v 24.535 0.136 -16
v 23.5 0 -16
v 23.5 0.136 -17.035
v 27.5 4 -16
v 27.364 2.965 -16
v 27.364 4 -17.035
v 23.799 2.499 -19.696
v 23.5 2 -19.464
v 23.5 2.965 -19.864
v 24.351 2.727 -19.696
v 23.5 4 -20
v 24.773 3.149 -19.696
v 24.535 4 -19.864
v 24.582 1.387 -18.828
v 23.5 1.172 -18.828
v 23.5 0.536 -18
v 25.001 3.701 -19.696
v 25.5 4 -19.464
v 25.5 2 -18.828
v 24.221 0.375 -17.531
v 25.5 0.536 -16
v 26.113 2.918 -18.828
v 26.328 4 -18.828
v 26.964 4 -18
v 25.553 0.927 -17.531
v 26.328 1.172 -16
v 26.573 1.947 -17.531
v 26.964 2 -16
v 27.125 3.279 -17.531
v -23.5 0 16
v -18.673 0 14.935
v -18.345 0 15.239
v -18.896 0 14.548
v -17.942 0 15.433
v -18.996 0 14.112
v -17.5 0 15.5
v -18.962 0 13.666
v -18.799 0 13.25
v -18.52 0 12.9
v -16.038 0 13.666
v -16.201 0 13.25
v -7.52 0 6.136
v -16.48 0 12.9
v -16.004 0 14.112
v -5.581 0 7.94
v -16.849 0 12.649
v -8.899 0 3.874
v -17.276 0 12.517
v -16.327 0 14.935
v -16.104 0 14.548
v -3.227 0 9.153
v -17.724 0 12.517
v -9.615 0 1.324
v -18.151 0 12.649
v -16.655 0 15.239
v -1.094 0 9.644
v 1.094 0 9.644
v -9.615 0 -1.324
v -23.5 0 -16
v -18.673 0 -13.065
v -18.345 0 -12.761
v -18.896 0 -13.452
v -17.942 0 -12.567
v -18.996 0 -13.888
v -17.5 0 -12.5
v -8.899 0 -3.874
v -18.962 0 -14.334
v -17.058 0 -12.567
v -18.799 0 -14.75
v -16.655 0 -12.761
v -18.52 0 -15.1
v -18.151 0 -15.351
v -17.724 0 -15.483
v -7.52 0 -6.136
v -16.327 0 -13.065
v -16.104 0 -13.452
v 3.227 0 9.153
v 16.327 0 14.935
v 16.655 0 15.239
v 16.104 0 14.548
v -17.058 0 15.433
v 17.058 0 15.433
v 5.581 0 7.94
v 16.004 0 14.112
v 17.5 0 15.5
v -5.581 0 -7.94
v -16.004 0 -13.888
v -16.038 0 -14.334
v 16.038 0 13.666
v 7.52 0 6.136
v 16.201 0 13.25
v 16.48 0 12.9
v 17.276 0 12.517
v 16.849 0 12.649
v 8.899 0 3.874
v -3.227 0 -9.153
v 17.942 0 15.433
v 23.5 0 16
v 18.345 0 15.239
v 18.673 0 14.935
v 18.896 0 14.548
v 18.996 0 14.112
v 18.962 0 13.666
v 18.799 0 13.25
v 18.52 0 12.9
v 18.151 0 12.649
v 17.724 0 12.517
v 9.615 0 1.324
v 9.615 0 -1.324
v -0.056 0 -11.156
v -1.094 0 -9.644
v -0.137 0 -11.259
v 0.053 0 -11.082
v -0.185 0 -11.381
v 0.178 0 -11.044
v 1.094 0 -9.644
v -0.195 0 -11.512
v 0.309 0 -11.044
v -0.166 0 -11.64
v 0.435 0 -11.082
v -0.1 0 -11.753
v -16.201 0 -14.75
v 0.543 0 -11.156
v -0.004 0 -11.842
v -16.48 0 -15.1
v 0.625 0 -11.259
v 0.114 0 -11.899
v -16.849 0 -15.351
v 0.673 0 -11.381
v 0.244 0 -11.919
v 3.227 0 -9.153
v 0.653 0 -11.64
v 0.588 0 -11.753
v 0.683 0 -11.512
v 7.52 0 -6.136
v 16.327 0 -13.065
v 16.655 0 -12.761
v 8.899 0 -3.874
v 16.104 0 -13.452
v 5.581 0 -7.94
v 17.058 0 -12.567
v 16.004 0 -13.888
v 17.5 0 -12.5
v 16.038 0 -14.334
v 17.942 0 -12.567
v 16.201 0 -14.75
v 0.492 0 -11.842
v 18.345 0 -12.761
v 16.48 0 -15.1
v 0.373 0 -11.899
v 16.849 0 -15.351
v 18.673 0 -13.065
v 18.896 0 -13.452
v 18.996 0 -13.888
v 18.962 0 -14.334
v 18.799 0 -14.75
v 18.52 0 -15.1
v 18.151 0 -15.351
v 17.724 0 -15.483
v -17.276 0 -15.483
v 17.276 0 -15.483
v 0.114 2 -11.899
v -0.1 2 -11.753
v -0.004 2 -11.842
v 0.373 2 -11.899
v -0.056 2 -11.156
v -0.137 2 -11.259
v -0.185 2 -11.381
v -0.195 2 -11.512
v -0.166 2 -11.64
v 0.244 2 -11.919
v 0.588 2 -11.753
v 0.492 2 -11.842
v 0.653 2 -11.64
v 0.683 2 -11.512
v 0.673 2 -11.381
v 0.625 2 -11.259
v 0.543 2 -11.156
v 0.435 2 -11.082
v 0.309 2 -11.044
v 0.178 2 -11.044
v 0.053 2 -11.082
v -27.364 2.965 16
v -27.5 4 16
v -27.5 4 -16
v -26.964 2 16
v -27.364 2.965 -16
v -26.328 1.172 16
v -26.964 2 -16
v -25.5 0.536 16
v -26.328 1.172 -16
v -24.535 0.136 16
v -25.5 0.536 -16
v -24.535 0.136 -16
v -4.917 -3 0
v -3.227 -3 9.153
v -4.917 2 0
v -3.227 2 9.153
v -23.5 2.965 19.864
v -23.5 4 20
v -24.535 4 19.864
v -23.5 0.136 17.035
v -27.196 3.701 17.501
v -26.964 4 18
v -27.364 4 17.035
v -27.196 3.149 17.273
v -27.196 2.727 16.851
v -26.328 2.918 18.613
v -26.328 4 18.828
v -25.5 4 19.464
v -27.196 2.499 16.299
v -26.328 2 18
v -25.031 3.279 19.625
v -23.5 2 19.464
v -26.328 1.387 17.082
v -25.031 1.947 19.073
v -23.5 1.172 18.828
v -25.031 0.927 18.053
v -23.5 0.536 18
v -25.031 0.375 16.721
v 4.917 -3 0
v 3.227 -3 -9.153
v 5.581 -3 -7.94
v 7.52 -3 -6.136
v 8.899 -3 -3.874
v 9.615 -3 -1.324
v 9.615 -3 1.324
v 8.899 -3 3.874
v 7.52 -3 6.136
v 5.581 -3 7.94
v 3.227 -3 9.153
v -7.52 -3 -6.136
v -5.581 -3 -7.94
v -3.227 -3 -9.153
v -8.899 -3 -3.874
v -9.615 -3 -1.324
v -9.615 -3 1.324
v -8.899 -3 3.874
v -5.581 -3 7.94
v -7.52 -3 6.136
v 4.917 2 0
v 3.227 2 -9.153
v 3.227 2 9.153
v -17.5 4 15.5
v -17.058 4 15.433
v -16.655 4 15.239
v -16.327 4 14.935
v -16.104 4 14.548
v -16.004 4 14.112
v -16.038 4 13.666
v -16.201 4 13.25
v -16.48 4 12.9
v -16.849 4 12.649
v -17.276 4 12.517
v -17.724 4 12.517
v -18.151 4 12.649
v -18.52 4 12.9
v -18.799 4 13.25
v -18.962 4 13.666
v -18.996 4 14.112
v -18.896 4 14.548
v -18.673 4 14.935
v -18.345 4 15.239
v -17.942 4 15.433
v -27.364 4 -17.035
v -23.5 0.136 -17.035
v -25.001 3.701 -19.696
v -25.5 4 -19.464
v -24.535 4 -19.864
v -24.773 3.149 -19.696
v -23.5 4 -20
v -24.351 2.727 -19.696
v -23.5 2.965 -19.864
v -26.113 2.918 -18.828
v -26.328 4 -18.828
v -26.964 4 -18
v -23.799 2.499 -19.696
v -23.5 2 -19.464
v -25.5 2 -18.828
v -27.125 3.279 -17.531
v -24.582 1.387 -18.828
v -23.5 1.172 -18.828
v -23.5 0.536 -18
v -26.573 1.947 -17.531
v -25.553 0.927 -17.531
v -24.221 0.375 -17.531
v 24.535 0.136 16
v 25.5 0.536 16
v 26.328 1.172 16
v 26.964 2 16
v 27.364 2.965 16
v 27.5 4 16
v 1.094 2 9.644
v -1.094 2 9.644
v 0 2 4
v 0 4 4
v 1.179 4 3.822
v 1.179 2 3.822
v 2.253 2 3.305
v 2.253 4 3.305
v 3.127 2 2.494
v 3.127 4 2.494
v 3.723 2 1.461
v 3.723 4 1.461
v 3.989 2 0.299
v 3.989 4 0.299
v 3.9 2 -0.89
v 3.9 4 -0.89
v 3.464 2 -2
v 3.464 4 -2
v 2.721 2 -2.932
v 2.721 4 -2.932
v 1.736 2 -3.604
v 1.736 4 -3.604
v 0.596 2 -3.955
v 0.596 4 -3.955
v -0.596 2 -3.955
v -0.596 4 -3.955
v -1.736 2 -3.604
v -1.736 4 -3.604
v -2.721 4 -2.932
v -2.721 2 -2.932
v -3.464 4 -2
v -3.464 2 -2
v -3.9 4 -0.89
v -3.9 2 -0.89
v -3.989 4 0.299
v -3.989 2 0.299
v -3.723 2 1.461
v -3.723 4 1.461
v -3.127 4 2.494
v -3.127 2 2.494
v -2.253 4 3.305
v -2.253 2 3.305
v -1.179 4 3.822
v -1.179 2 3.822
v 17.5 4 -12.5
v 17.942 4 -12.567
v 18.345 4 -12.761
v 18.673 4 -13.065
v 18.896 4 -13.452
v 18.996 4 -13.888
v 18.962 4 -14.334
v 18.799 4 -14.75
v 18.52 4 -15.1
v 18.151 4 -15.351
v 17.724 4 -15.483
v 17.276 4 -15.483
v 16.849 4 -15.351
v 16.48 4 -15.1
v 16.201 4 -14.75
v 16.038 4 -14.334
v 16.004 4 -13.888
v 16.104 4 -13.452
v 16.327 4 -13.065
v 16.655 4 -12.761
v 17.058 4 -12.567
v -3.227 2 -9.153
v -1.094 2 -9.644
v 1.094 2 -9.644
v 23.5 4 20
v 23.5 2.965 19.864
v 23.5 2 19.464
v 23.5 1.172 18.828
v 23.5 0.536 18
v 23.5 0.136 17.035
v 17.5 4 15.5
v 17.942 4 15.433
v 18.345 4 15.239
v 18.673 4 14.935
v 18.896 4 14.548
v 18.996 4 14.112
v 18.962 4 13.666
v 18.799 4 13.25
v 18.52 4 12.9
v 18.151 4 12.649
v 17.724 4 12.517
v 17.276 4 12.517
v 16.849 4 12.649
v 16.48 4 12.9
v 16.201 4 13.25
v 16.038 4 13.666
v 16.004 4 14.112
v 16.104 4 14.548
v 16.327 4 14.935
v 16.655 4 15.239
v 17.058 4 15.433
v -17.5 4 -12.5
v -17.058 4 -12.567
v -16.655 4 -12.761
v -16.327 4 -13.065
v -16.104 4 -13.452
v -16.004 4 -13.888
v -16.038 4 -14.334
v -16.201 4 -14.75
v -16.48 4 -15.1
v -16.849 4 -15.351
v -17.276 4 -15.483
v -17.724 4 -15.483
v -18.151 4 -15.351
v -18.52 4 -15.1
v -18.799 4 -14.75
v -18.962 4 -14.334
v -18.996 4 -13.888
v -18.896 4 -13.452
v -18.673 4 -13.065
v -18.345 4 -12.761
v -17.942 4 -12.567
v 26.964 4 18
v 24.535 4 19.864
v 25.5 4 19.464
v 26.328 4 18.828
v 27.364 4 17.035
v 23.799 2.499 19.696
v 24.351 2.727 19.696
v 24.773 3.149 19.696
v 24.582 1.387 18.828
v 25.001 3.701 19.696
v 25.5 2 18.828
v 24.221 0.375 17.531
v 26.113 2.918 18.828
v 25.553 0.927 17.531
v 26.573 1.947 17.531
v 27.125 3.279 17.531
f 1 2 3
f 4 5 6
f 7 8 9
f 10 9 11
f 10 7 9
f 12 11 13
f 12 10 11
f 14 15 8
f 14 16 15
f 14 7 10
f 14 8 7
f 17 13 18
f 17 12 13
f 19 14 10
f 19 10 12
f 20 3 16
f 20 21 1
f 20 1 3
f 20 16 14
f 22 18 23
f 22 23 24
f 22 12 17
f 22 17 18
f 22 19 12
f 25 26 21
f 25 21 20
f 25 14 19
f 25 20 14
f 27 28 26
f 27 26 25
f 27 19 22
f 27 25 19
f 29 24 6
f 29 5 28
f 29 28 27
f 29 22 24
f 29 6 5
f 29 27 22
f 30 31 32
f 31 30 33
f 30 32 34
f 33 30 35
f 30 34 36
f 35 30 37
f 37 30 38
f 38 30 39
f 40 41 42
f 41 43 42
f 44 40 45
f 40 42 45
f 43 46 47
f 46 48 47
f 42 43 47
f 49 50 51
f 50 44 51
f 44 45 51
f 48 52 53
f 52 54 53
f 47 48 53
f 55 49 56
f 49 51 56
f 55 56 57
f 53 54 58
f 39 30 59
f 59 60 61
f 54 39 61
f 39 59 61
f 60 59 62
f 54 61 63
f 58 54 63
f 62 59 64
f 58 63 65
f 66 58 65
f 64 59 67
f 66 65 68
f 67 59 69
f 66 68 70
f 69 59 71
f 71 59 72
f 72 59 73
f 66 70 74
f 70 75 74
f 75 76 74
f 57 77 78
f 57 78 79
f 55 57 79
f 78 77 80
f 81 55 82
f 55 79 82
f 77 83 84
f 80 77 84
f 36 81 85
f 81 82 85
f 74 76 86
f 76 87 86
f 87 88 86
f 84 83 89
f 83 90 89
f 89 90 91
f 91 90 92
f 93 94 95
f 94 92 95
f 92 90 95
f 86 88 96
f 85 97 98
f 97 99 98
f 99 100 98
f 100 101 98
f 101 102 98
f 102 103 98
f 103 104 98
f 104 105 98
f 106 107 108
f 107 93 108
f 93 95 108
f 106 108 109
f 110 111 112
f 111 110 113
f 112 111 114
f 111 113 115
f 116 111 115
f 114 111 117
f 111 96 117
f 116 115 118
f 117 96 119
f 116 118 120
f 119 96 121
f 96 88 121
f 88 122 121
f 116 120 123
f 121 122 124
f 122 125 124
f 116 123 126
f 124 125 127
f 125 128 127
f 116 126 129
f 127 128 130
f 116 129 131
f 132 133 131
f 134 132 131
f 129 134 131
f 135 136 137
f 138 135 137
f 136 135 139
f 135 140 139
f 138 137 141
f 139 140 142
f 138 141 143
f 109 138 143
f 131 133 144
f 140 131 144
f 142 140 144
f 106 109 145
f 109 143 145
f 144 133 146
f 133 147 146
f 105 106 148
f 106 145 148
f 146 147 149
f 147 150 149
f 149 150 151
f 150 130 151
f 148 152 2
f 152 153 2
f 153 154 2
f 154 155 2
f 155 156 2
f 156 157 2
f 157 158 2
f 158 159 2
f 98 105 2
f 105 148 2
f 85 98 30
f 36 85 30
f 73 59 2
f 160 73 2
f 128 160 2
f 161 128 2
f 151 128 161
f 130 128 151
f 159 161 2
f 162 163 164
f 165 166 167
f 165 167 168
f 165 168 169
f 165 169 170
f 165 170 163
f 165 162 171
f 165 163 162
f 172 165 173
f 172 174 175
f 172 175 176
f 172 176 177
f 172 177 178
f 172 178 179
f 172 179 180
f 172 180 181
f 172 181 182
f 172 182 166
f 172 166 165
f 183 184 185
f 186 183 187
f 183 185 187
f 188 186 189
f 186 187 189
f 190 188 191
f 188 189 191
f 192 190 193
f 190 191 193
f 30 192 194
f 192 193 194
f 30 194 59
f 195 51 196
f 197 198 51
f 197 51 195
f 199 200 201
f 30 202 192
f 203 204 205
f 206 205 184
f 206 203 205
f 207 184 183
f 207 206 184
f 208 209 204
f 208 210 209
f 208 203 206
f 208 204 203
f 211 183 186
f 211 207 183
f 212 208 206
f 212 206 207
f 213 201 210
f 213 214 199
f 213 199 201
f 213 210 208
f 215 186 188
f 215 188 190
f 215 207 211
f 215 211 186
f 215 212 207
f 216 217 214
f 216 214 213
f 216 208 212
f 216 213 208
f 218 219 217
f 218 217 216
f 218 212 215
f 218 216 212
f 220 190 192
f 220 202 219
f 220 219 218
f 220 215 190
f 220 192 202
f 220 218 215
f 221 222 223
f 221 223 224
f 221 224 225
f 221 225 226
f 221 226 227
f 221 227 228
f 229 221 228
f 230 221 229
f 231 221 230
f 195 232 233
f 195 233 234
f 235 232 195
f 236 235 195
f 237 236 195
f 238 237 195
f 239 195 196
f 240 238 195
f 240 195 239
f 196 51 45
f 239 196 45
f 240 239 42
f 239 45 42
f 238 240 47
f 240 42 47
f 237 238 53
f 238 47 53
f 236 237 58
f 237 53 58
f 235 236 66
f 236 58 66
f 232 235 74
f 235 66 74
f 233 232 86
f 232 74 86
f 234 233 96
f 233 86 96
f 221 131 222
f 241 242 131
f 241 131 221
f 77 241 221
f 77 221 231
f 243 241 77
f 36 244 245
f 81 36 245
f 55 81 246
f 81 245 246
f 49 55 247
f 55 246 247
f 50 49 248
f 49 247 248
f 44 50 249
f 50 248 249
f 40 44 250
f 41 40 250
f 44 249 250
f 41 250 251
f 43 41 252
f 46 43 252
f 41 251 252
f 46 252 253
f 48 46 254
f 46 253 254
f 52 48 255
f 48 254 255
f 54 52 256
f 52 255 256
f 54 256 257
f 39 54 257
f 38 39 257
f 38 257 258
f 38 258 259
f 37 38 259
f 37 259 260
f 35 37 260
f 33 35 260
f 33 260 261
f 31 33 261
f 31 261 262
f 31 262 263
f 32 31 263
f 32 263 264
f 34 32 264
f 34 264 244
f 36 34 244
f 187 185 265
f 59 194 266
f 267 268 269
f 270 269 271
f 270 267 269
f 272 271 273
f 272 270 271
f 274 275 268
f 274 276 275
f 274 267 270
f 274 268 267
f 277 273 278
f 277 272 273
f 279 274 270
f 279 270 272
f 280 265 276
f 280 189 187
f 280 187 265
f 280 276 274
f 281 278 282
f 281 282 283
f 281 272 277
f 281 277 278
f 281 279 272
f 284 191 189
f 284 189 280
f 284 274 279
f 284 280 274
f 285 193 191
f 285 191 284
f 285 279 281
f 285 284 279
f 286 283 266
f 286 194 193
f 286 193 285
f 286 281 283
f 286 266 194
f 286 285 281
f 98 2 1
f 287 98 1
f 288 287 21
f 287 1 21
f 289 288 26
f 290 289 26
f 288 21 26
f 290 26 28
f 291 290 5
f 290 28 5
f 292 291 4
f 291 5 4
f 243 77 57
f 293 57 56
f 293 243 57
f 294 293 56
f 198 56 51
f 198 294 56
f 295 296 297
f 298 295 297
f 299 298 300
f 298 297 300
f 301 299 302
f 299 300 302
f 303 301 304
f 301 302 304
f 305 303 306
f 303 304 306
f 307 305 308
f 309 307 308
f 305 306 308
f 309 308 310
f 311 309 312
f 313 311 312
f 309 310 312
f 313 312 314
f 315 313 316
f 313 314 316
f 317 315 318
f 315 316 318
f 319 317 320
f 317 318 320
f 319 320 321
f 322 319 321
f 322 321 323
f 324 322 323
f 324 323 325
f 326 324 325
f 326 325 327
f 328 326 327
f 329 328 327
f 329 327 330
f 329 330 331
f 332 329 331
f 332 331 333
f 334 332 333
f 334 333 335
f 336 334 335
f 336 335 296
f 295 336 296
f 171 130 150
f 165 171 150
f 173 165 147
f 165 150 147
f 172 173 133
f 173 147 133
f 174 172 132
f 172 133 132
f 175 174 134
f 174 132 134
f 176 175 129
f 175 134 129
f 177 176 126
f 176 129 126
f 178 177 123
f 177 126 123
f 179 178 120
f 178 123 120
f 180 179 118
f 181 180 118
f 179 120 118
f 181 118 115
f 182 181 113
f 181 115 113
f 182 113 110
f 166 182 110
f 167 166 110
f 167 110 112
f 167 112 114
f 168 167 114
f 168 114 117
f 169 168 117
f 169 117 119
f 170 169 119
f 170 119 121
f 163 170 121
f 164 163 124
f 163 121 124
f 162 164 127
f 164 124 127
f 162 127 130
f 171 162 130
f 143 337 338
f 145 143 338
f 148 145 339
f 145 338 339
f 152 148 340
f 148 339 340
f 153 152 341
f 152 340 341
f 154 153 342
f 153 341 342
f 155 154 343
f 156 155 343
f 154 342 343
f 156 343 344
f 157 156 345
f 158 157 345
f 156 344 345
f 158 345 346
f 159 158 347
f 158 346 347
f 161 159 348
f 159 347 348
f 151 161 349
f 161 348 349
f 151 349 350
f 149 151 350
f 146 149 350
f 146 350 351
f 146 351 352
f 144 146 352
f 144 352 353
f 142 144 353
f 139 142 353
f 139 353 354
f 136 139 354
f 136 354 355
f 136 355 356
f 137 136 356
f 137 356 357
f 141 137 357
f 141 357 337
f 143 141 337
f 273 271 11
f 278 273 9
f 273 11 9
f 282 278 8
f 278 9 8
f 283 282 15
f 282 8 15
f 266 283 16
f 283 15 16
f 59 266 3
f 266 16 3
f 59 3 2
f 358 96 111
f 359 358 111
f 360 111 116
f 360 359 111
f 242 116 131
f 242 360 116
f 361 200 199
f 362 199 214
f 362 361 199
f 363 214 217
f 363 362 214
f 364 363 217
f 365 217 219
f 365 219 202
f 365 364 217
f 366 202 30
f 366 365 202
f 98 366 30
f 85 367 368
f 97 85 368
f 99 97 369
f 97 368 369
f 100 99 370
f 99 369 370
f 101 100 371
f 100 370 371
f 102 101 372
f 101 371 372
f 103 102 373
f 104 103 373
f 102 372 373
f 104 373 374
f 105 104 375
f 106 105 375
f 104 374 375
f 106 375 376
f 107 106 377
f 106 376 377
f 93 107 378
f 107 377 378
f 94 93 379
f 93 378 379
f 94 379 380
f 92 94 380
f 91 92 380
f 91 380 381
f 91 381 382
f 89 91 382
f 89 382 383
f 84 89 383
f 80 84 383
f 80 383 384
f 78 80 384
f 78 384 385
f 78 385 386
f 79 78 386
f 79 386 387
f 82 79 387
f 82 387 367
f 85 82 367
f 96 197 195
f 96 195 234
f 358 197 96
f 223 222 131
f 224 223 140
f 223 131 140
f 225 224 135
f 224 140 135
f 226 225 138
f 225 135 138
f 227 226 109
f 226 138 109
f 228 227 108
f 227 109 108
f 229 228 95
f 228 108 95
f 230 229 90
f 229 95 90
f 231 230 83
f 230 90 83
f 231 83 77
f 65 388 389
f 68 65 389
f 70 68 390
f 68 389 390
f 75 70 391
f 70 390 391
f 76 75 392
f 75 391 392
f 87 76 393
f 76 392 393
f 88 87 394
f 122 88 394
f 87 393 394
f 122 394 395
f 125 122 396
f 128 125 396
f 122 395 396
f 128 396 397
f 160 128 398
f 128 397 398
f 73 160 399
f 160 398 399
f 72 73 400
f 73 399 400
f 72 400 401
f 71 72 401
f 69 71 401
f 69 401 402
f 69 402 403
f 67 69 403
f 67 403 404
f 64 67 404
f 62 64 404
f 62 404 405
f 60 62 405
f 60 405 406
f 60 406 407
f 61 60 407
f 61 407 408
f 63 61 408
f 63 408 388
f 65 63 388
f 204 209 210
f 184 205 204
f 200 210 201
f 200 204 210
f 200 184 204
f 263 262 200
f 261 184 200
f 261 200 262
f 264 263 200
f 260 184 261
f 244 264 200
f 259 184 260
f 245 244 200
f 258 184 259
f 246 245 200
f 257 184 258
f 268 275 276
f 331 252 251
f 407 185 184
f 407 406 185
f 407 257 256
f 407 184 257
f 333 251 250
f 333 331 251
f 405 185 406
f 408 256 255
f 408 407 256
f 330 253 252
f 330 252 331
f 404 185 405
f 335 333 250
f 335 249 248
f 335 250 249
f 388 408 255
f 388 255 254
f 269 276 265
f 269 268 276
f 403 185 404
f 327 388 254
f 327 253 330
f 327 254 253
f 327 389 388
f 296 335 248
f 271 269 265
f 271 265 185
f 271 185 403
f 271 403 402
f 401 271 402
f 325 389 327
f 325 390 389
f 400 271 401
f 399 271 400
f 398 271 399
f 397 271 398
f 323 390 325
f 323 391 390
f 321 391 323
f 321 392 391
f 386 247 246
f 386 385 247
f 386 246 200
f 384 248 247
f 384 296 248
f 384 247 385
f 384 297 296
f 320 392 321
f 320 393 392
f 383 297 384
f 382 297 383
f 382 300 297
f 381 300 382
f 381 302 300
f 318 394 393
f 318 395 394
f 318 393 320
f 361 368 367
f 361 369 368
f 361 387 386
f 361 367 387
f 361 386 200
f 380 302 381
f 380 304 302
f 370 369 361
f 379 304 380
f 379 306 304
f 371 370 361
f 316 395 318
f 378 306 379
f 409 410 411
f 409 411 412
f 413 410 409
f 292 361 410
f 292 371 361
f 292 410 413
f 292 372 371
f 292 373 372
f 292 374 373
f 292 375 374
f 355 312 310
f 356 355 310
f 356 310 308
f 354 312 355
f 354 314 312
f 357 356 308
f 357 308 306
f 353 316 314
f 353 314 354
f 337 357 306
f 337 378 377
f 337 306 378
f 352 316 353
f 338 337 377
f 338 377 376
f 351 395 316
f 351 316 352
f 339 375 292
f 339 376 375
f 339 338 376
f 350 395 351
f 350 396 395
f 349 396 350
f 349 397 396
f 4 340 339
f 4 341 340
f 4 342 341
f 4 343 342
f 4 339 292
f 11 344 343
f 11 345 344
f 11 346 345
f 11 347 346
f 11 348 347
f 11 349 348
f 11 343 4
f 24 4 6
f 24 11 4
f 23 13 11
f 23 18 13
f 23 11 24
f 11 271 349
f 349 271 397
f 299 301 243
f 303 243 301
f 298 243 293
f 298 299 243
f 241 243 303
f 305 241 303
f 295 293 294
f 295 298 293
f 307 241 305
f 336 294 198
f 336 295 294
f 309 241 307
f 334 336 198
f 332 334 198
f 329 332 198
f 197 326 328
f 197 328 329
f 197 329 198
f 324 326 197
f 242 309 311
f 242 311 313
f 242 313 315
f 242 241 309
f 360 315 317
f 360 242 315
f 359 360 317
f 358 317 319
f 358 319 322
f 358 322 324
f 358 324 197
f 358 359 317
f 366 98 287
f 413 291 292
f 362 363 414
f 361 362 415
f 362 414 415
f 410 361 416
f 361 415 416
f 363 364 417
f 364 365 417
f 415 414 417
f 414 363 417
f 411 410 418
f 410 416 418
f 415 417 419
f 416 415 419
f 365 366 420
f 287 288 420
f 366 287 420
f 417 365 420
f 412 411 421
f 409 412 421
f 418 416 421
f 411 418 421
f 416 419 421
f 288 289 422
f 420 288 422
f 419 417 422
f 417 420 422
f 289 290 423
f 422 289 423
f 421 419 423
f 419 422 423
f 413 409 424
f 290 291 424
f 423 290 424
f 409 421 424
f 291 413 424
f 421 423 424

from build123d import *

# Parameters (mm, degrees)
SKETCH_1_W             = 55
SKETCH_1_H             = 40
EXTRUDE_1_DEPTH        = 4
CUT_EXTRUDE_START      = 4
SKETCH_1_6_OUTSIDE_W   = 70.624
SKETCH_1_6_OUTSIDE_H   = 55.624
SKETCH_1_6_OUTSIDE_W_2 = 55
SKETCH_1_6_OUTSIDE_H_2 = 40
SKETCH_1_6_OUTSIDE_R   = 4
SKETCH_1_6_OUTSIDE_R_2 = 1.5
CUT_EXTRUDE_5_DEPTH    = 5
FILLET_4_R             = 4
FILLET_6_R             = 4
FILLET_7_R             = 4
FILLET_8_R             = 4
SKETCH_2_R             = 9.705576387
EXTRUDE_2_DEPTH        = 3
CUT_EXTRUDE_START_2    = -5
CUT_EXTRUDE_7_DEPTH    = 5
SKETCH_4_R             = 0.44
CUT_EXTRUDE_8_DEPTH    = 2


with BuildPart() as part:
    # 草图1 → 凸台-拉伸1 (new body)
    with BuildSketch(Plane(origin=(0, 0, 0), x_dir=(1, 0, 0), z_dir=(0, 1, 0))):
        Rectangle(SKETCH_1_W, SKETCH_1_H)
    extrude(amount=EXTRUDE_1_DEPTH)

    # 草图1<6> outside → 切除-拉伸5 (cut)
    # profile 1 of 6: a face of its own
    with BuildSketch(Plane(origin=(0, 0, 0), x_dir=(1, 0, 0), z_dir=(0, 1, 0)).offset(CUT_EXTRUDE_START)):
        Rectangle(SKETCH_1_6_OUTSIDE_W, SKETCH_1_6_OUTSIDE_H)
        Rectangle(SKETCH_1_6_OUTSIDE_W_2, SKETCH_1_6_OUTSIDE_H_2, mode=Mode.SUBTRACT)
    # profile 2 of 6: a face of its own
    with BuildSketch(Plane(origin=(0, 0, 0), x_dir=(1, 0, 0), z_dir=(0, 1, 0)).offset(CUT_EXTRUDE_START)):
        with Locations(Location((0, 0, 0), (0, 0, 270))):
            Circle(SKETCH_1_6_OUTSIDE_R)
    # profile 3 of 6: a face of its own
    with BuildSketch(Plane(origin=(0, 0, 0), x_dir=(1, 0, 0), z_dir=(0, 1, 0)).offset(CUT_EXTRUDE_START)):
        with Locations(Location((-17.5, 14, 0), (0, 0, 270))):
            Circle(SKETCH_1_6_OUTSIDE_R_2)
    # profile 4 of 6: a face of its own
    with BuildSketch(Plane(origin=(0, 0, 0), x_dir=(1, 0, 0), z_dir=(0, 1, 0)).offset(CUT_EXTRUDE_START)):
        with Locations(Location((17.5, 14, 0), (0, 0, 270))):
            Circle(SKETCH_1_6_OUTSIDE_R_2)
    # profile 5 of 6: a face of its own
    with BuildSketch(Plane(origin=(0, 0, 0), x_dir=(1, 0, 0), z_dir=(0, 1, 0)).offset(CUT_EXTRUDE_START)):
        with Locations(Location((17.5, -14, 0), (0, 0, 270))):
            Circle(SKETCH_1_6_OUTSIDE_R_2)
    # profile 6 of 6: a face of its own
    with BuildSketch(Plane(origin=(0, 0, 0), x_dir=(1, 0, 0), z_dir=(0, 1, 0)).offset(CUT_EXTRUDE_START)):
        with Locations(Location((-17.5, -14, 0), (0, 0, 270))):
            Circle(SKETCH_1_6_OUTSIDE_R_2)
    extrude(amount=-CUT_EXTRUDE_5_DEPTH, mode=Mode.SUBTRACT)

    # 圆角4
    fillet_4_edges = [part.edges().sort_by_distance(p)[0] for p in [
        (27.5, 0, 0),
    ]]
    fillet(fillet_4_edges, radius=FILLET_4_R - 0.0001)  # a hair under: the kernel refuses the full size

    # 圆角6
    fillet_6_edges = [part.edges().sort_by_distance(p)[0] for p in [
        (26.328456414, 1.171543586, 20),
        (-1.99995, 0, 20),
    ]]
    fillet(fillet_6_edges, radius=FILLET_6_R - 0.0001)  # a hair under: the kernel refuses the full size

    # 圆角7
    fillet_7_edges = [part.edges().sort_by_distance(p)[0] for p in [
        (-27.5, 1.171543586, 18.828456414),
        (-27.5, 0, -1.99995),
    ]]
    fillet(fillet_7_edges, radius=FILLET_7_R - 0.0001)  # a hair under: the kernel refuses the full size

    # 圆角8
    fillet_8_edges = [part.edges().sort_by_distance(p)[0] for p in [
        (26.328456414, 1.171543586, -20),
        (0, 0, -20),
        (-26.328456414, 1.171543586, -20),
    ]]
    fillet(fillet_8_edges, radius=FILLET_8_R - 0.0001)  # a hair under: the kernel refuses the full size

    # 草图2 → 凸台-拉伸2 (add)
    with BuildSketch(Plane.XZ):
        with Locations(Location((0, 0, 0), (0, 0, 90))):
            Circle(SKETCH_2_R)
    extrude(amount=EXTRUDE_2_DEPTH)

    # 草图3 → 切除-拉伸7 (cut)
    with BuildSketch(Plane(origin=(0, -3, 0), x_dir=(-1, 0, 0), z_dir=(0, -1, 0)).offset(CUT_EXTRUDE_START_2)):
        with BuildLine():
            Line((3.226722166, -9.153495347), (4.917462581, 0))
            Line((4.917462581, 0), (3.226722166, 9.153495347))
            ThreePointArc((3.226722166, 9.153495347), (0, 9.705576387), (-3.226722166, 9.153495347))
            Line((-3.226722166, 9.153495347), (-4.917462581, 0))
            Line((-4.917462581, 0), (-3.226722166, -9.153495347))
            ThreePointArc((-3.226722166, -9.153495347), (0, -9.705576387), (3.226722166, -9.153495347))
        make_face()
    extrude(amount=CUT_EXTRUDE_7_DEPTH, mode=Mode.SUBTRACT)

    # 草图4 → 切除-拉伸8 (cut)
    with BuildSketch(Plane.XZ):
        with Locations(Location((0.243749782, -11.478919209, 0), (0, 0, 270))):
            Circle(SKETCH_4_R)
    extrude(amount=-CUT_EXTRUDE_8_DEPTH, mode=Mode.SUBTRACT)


solid = part.part
